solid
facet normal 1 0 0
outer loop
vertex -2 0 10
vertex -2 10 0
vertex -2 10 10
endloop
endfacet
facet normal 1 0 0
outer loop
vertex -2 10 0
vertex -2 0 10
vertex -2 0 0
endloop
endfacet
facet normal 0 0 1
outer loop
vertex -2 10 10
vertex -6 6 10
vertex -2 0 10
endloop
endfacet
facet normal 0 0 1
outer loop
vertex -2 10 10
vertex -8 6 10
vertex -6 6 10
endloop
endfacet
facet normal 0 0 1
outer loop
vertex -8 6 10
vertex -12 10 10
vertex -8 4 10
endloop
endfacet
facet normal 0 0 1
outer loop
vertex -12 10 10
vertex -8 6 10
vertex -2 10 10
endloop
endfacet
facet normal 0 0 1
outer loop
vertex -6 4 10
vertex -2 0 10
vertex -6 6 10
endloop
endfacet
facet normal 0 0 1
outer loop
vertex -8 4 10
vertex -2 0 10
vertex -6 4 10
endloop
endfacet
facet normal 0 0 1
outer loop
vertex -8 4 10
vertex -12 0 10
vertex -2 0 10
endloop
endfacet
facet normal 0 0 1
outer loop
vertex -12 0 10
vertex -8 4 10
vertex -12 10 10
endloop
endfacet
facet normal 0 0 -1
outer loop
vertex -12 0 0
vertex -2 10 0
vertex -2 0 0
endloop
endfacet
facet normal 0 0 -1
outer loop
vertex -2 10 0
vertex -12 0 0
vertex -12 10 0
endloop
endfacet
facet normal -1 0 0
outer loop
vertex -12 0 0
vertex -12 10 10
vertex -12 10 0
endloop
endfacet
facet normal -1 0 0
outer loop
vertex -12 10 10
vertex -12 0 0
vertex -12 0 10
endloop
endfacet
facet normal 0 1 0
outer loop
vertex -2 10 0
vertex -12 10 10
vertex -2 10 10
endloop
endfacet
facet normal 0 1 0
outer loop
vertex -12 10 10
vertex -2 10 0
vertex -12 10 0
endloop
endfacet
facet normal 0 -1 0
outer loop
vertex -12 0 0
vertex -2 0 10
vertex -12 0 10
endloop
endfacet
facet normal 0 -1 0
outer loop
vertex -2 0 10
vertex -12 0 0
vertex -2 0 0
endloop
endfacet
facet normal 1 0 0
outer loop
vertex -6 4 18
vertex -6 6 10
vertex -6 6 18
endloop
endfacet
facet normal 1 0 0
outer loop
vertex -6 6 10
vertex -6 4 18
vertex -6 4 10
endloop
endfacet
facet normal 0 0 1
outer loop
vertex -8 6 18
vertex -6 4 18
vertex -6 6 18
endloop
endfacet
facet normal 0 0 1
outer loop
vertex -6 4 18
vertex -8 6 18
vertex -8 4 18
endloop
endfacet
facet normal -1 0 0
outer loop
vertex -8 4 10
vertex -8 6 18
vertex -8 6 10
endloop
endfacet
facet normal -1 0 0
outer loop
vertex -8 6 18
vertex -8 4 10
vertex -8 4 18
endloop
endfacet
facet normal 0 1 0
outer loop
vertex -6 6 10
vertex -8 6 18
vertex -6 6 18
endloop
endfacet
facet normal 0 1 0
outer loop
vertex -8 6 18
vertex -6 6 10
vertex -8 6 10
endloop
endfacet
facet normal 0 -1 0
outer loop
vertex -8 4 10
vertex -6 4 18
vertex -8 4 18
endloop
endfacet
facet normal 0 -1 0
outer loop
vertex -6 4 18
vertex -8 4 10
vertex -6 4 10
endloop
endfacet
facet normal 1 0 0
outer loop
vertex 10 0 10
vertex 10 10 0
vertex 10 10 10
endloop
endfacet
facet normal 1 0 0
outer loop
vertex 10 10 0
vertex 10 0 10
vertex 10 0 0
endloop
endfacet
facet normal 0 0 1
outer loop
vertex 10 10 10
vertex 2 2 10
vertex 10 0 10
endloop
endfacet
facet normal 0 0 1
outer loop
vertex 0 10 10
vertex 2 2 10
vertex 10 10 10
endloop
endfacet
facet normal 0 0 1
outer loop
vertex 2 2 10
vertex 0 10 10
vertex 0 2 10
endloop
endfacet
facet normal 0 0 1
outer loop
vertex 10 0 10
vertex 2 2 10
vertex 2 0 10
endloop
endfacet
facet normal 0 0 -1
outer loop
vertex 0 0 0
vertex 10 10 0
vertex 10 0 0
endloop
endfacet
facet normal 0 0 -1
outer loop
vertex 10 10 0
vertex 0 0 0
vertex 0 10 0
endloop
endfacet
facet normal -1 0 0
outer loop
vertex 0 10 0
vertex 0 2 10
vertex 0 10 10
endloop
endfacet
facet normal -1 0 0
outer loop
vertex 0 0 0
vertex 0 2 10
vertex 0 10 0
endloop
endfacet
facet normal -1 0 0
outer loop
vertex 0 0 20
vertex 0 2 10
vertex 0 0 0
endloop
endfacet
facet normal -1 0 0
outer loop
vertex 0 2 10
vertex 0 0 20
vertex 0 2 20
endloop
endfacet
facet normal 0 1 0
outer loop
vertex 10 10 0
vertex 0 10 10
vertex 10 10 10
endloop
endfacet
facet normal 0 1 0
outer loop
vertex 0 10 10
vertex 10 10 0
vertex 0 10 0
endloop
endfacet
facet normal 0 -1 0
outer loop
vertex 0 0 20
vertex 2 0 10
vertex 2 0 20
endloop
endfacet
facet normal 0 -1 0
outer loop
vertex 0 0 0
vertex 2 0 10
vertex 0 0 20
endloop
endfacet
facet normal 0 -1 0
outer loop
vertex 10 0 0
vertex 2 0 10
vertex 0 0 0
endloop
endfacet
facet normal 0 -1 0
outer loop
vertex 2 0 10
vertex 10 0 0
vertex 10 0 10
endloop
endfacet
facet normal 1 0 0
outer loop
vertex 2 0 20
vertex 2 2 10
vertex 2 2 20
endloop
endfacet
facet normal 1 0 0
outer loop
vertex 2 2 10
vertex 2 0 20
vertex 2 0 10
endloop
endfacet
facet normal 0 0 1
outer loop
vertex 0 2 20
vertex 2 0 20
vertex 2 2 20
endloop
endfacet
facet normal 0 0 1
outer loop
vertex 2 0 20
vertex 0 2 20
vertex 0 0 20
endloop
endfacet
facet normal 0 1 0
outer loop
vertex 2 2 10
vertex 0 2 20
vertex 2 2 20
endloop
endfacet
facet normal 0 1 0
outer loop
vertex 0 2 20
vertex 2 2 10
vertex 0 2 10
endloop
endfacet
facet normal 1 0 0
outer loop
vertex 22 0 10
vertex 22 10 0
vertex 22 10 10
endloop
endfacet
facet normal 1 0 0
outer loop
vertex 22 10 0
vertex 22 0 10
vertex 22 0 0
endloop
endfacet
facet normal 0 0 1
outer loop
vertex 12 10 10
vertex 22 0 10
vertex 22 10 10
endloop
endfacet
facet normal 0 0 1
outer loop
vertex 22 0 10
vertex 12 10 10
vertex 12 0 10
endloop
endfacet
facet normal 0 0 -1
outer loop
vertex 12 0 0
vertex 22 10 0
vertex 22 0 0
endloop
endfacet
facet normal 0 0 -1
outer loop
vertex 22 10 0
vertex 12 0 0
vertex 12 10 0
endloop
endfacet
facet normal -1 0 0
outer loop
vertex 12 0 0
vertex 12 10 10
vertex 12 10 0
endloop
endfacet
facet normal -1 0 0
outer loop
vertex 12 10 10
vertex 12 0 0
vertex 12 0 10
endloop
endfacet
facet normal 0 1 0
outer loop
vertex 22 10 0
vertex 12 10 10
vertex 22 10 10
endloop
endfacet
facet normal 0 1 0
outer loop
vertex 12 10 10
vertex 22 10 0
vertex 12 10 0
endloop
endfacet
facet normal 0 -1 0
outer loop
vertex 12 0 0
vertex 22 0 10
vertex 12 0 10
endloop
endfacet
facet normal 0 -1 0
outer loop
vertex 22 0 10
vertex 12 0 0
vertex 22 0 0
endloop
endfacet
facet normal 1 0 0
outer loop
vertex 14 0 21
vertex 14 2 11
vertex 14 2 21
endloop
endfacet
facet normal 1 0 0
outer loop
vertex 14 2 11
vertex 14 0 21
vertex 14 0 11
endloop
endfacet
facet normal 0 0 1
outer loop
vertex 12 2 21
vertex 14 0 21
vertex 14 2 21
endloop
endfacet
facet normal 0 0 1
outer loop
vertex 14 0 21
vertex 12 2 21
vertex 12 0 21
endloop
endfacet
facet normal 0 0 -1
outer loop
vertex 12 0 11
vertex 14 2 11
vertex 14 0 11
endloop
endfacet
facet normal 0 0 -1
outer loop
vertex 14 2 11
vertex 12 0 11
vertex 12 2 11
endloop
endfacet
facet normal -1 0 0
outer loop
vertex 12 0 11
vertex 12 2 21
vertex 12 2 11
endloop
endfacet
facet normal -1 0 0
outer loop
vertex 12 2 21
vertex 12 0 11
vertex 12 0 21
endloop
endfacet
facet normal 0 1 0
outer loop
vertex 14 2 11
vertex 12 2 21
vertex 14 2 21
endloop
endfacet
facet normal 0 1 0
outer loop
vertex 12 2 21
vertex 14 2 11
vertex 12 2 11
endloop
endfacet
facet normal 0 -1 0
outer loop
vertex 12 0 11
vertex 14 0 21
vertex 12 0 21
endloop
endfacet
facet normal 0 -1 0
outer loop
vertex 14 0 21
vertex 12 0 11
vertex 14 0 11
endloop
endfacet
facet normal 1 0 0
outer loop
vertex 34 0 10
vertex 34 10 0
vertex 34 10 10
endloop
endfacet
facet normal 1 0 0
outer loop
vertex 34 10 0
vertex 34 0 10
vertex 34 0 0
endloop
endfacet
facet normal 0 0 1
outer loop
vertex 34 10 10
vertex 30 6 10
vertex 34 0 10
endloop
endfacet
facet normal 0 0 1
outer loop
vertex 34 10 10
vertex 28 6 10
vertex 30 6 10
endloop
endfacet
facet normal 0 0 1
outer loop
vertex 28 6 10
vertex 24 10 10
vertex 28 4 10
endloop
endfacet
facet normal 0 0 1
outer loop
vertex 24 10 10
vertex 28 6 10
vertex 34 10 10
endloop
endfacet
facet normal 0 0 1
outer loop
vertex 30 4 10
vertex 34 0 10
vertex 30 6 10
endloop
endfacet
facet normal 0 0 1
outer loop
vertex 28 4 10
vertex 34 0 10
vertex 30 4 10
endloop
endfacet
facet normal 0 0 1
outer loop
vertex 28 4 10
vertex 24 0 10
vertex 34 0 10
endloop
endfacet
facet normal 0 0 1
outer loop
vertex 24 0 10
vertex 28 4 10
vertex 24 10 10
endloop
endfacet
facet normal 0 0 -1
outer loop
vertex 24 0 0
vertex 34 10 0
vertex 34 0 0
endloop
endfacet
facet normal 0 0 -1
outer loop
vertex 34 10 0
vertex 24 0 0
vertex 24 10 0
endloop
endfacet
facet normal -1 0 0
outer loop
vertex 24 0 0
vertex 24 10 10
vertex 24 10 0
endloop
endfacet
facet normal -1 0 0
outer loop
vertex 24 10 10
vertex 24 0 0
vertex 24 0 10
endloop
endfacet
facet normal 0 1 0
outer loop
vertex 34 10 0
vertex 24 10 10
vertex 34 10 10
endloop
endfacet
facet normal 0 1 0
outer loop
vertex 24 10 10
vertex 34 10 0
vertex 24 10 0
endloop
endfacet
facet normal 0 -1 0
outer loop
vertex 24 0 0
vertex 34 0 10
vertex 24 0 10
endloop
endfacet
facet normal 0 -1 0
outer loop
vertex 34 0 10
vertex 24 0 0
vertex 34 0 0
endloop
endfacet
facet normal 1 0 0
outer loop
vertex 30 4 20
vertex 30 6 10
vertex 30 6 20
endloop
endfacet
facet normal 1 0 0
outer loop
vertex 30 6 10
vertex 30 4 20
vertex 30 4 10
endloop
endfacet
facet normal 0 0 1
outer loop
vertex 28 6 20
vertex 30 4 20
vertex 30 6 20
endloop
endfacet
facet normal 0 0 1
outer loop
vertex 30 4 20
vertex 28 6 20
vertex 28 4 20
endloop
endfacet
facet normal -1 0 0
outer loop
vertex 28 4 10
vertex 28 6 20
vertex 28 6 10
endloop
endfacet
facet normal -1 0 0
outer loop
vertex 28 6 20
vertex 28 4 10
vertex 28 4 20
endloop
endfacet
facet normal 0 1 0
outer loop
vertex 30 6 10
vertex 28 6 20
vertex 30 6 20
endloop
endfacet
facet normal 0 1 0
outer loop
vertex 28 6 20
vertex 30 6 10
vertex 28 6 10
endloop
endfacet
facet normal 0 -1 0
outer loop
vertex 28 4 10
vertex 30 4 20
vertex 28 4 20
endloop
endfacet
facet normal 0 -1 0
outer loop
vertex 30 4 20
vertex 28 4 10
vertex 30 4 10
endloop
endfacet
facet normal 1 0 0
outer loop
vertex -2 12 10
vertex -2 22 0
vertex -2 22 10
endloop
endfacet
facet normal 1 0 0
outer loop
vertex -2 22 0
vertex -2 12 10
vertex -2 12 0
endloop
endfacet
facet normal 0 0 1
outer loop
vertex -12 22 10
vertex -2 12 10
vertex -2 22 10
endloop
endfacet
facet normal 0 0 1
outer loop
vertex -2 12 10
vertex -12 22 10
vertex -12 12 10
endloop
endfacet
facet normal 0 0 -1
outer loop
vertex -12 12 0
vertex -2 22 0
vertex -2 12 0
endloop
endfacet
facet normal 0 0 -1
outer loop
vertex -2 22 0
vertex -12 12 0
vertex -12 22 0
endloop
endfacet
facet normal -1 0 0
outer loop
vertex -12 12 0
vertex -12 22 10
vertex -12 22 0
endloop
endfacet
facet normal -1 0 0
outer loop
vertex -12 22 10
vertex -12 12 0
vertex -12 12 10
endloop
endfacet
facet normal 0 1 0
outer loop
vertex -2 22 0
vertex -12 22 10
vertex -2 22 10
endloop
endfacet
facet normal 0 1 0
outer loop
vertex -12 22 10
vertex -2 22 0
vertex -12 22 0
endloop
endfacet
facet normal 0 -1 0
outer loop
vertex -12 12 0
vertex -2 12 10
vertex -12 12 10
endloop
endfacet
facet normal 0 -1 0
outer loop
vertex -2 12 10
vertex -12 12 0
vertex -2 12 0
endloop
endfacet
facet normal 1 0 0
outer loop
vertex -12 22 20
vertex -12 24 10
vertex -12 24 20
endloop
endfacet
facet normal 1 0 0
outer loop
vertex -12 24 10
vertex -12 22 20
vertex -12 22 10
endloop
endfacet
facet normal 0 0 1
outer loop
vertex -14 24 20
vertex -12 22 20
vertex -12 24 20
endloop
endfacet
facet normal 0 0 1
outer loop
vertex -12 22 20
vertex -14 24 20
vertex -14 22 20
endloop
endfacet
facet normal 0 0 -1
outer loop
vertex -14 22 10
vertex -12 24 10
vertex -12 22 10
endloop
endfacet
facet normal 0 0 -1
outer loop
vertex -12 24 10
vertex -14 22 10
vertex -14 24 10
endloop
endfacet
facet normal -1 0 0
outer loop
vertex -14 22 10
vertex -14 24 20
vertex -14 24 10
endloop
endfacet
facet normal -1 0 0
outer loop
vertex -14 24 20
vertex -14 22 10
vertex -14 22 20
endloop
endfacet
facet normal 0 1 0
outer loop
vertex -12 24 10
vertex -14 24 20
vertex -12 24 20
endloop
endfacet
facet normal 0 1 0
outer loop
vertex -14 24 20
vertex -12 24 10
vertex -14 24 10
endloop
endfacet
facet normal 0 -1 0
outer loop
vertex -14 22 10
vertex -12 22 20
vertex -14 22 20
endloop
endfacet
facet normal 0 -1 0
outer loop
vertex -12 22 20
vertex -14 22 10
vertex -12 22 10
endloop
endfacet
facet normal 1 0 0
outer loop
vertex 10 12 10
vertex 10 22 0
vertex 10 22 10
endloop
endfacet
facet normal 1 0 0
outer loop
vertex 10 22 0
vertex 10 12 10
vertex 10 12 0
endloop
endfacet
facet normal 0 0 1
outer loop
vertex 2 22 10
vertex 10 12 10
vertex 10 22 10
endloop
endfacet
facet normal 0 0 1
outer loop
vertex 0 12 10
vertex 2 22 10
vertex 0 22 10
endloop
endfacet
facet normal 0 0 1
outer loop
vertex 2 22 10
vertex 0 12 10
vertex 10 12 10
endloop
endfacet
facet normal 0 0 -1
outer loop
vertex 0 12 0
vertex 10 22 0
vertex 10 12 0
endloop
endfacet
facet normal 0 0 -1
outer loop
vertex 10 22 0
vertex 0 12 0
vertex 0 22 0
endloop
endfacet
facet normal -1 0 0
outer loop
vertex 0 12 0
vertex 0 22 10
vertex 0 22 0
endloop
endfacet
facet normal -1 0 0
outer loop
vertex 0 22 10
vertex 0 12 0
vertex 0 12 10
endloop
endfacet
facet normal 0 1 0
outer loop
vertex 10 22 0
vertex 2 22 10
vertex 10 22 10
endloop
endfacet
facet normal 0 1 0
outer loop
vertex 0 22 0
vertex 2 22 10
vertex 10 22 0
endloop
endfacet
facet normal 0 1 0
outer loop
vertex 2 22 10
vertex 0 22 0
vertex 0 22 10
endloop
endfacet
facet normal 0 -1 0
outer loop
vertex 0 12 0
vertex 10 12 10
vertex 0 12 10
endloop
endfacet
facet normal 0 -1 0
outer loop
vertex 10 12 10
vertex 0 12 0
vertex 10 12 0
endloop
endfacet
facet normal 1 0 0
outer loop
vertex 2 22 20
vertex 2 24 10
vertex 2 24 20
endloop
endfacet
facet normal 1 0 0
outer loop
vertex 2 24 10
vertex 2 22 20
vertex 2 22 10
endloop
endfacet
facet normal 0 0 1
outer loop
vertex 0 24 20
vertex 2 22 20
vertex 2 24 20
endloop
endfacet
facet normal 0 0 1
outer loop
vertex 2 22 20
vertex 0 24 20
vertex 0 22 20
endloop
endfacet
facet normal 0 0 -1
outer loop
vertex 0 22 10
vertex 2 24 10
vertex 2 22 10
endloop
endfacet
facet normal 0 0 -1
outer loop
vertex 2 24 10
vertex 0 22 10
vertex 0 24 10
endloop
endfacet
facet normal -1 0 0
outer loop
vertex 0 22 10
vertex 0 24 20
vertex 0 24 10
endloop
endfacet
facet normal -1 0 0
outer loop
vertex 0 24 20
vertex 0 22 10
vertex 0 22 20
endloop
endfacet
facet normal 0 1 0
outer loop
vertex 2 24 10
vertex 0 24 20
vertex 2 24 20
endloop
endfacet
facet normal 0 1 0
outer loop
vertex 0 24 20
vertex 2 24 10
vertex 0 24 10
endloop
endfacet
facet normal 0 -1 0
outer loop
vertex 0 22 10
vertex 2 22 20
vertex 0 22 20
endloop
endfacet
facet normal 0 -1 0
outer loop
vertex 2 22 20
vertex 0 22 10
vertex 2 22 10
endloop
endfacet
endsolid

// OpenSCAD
// Volume: 6232, SurfaceArea: 4088
translate([-12,0,0]) union() {
  cube([10,10,10]);
  translate([4,4,8]) cube([2,2,10]);
}

union() {
  cube([10,10,10]);
  translate([0,0,10]) cube([2,2,10]);
}

translate([12,0,0]) union() {
  cube([10,10,10]);
  translate([0,0,11]) cube([2,2,10]);
}

translate([24,0,0]) union() {
  cube([10,10,10]);
  translate([4,4,10]) cube([2,2,10]);
}

translate([-12,12,0]) union() {
  cube([10,10,10]);
  translate([-2,10,10]) cube([2,2,10]);
}

translate([0,12,0]) union() {
  cube([10,10,10]);
  translate([0,10,10]) cube([2,2,10]);
}
